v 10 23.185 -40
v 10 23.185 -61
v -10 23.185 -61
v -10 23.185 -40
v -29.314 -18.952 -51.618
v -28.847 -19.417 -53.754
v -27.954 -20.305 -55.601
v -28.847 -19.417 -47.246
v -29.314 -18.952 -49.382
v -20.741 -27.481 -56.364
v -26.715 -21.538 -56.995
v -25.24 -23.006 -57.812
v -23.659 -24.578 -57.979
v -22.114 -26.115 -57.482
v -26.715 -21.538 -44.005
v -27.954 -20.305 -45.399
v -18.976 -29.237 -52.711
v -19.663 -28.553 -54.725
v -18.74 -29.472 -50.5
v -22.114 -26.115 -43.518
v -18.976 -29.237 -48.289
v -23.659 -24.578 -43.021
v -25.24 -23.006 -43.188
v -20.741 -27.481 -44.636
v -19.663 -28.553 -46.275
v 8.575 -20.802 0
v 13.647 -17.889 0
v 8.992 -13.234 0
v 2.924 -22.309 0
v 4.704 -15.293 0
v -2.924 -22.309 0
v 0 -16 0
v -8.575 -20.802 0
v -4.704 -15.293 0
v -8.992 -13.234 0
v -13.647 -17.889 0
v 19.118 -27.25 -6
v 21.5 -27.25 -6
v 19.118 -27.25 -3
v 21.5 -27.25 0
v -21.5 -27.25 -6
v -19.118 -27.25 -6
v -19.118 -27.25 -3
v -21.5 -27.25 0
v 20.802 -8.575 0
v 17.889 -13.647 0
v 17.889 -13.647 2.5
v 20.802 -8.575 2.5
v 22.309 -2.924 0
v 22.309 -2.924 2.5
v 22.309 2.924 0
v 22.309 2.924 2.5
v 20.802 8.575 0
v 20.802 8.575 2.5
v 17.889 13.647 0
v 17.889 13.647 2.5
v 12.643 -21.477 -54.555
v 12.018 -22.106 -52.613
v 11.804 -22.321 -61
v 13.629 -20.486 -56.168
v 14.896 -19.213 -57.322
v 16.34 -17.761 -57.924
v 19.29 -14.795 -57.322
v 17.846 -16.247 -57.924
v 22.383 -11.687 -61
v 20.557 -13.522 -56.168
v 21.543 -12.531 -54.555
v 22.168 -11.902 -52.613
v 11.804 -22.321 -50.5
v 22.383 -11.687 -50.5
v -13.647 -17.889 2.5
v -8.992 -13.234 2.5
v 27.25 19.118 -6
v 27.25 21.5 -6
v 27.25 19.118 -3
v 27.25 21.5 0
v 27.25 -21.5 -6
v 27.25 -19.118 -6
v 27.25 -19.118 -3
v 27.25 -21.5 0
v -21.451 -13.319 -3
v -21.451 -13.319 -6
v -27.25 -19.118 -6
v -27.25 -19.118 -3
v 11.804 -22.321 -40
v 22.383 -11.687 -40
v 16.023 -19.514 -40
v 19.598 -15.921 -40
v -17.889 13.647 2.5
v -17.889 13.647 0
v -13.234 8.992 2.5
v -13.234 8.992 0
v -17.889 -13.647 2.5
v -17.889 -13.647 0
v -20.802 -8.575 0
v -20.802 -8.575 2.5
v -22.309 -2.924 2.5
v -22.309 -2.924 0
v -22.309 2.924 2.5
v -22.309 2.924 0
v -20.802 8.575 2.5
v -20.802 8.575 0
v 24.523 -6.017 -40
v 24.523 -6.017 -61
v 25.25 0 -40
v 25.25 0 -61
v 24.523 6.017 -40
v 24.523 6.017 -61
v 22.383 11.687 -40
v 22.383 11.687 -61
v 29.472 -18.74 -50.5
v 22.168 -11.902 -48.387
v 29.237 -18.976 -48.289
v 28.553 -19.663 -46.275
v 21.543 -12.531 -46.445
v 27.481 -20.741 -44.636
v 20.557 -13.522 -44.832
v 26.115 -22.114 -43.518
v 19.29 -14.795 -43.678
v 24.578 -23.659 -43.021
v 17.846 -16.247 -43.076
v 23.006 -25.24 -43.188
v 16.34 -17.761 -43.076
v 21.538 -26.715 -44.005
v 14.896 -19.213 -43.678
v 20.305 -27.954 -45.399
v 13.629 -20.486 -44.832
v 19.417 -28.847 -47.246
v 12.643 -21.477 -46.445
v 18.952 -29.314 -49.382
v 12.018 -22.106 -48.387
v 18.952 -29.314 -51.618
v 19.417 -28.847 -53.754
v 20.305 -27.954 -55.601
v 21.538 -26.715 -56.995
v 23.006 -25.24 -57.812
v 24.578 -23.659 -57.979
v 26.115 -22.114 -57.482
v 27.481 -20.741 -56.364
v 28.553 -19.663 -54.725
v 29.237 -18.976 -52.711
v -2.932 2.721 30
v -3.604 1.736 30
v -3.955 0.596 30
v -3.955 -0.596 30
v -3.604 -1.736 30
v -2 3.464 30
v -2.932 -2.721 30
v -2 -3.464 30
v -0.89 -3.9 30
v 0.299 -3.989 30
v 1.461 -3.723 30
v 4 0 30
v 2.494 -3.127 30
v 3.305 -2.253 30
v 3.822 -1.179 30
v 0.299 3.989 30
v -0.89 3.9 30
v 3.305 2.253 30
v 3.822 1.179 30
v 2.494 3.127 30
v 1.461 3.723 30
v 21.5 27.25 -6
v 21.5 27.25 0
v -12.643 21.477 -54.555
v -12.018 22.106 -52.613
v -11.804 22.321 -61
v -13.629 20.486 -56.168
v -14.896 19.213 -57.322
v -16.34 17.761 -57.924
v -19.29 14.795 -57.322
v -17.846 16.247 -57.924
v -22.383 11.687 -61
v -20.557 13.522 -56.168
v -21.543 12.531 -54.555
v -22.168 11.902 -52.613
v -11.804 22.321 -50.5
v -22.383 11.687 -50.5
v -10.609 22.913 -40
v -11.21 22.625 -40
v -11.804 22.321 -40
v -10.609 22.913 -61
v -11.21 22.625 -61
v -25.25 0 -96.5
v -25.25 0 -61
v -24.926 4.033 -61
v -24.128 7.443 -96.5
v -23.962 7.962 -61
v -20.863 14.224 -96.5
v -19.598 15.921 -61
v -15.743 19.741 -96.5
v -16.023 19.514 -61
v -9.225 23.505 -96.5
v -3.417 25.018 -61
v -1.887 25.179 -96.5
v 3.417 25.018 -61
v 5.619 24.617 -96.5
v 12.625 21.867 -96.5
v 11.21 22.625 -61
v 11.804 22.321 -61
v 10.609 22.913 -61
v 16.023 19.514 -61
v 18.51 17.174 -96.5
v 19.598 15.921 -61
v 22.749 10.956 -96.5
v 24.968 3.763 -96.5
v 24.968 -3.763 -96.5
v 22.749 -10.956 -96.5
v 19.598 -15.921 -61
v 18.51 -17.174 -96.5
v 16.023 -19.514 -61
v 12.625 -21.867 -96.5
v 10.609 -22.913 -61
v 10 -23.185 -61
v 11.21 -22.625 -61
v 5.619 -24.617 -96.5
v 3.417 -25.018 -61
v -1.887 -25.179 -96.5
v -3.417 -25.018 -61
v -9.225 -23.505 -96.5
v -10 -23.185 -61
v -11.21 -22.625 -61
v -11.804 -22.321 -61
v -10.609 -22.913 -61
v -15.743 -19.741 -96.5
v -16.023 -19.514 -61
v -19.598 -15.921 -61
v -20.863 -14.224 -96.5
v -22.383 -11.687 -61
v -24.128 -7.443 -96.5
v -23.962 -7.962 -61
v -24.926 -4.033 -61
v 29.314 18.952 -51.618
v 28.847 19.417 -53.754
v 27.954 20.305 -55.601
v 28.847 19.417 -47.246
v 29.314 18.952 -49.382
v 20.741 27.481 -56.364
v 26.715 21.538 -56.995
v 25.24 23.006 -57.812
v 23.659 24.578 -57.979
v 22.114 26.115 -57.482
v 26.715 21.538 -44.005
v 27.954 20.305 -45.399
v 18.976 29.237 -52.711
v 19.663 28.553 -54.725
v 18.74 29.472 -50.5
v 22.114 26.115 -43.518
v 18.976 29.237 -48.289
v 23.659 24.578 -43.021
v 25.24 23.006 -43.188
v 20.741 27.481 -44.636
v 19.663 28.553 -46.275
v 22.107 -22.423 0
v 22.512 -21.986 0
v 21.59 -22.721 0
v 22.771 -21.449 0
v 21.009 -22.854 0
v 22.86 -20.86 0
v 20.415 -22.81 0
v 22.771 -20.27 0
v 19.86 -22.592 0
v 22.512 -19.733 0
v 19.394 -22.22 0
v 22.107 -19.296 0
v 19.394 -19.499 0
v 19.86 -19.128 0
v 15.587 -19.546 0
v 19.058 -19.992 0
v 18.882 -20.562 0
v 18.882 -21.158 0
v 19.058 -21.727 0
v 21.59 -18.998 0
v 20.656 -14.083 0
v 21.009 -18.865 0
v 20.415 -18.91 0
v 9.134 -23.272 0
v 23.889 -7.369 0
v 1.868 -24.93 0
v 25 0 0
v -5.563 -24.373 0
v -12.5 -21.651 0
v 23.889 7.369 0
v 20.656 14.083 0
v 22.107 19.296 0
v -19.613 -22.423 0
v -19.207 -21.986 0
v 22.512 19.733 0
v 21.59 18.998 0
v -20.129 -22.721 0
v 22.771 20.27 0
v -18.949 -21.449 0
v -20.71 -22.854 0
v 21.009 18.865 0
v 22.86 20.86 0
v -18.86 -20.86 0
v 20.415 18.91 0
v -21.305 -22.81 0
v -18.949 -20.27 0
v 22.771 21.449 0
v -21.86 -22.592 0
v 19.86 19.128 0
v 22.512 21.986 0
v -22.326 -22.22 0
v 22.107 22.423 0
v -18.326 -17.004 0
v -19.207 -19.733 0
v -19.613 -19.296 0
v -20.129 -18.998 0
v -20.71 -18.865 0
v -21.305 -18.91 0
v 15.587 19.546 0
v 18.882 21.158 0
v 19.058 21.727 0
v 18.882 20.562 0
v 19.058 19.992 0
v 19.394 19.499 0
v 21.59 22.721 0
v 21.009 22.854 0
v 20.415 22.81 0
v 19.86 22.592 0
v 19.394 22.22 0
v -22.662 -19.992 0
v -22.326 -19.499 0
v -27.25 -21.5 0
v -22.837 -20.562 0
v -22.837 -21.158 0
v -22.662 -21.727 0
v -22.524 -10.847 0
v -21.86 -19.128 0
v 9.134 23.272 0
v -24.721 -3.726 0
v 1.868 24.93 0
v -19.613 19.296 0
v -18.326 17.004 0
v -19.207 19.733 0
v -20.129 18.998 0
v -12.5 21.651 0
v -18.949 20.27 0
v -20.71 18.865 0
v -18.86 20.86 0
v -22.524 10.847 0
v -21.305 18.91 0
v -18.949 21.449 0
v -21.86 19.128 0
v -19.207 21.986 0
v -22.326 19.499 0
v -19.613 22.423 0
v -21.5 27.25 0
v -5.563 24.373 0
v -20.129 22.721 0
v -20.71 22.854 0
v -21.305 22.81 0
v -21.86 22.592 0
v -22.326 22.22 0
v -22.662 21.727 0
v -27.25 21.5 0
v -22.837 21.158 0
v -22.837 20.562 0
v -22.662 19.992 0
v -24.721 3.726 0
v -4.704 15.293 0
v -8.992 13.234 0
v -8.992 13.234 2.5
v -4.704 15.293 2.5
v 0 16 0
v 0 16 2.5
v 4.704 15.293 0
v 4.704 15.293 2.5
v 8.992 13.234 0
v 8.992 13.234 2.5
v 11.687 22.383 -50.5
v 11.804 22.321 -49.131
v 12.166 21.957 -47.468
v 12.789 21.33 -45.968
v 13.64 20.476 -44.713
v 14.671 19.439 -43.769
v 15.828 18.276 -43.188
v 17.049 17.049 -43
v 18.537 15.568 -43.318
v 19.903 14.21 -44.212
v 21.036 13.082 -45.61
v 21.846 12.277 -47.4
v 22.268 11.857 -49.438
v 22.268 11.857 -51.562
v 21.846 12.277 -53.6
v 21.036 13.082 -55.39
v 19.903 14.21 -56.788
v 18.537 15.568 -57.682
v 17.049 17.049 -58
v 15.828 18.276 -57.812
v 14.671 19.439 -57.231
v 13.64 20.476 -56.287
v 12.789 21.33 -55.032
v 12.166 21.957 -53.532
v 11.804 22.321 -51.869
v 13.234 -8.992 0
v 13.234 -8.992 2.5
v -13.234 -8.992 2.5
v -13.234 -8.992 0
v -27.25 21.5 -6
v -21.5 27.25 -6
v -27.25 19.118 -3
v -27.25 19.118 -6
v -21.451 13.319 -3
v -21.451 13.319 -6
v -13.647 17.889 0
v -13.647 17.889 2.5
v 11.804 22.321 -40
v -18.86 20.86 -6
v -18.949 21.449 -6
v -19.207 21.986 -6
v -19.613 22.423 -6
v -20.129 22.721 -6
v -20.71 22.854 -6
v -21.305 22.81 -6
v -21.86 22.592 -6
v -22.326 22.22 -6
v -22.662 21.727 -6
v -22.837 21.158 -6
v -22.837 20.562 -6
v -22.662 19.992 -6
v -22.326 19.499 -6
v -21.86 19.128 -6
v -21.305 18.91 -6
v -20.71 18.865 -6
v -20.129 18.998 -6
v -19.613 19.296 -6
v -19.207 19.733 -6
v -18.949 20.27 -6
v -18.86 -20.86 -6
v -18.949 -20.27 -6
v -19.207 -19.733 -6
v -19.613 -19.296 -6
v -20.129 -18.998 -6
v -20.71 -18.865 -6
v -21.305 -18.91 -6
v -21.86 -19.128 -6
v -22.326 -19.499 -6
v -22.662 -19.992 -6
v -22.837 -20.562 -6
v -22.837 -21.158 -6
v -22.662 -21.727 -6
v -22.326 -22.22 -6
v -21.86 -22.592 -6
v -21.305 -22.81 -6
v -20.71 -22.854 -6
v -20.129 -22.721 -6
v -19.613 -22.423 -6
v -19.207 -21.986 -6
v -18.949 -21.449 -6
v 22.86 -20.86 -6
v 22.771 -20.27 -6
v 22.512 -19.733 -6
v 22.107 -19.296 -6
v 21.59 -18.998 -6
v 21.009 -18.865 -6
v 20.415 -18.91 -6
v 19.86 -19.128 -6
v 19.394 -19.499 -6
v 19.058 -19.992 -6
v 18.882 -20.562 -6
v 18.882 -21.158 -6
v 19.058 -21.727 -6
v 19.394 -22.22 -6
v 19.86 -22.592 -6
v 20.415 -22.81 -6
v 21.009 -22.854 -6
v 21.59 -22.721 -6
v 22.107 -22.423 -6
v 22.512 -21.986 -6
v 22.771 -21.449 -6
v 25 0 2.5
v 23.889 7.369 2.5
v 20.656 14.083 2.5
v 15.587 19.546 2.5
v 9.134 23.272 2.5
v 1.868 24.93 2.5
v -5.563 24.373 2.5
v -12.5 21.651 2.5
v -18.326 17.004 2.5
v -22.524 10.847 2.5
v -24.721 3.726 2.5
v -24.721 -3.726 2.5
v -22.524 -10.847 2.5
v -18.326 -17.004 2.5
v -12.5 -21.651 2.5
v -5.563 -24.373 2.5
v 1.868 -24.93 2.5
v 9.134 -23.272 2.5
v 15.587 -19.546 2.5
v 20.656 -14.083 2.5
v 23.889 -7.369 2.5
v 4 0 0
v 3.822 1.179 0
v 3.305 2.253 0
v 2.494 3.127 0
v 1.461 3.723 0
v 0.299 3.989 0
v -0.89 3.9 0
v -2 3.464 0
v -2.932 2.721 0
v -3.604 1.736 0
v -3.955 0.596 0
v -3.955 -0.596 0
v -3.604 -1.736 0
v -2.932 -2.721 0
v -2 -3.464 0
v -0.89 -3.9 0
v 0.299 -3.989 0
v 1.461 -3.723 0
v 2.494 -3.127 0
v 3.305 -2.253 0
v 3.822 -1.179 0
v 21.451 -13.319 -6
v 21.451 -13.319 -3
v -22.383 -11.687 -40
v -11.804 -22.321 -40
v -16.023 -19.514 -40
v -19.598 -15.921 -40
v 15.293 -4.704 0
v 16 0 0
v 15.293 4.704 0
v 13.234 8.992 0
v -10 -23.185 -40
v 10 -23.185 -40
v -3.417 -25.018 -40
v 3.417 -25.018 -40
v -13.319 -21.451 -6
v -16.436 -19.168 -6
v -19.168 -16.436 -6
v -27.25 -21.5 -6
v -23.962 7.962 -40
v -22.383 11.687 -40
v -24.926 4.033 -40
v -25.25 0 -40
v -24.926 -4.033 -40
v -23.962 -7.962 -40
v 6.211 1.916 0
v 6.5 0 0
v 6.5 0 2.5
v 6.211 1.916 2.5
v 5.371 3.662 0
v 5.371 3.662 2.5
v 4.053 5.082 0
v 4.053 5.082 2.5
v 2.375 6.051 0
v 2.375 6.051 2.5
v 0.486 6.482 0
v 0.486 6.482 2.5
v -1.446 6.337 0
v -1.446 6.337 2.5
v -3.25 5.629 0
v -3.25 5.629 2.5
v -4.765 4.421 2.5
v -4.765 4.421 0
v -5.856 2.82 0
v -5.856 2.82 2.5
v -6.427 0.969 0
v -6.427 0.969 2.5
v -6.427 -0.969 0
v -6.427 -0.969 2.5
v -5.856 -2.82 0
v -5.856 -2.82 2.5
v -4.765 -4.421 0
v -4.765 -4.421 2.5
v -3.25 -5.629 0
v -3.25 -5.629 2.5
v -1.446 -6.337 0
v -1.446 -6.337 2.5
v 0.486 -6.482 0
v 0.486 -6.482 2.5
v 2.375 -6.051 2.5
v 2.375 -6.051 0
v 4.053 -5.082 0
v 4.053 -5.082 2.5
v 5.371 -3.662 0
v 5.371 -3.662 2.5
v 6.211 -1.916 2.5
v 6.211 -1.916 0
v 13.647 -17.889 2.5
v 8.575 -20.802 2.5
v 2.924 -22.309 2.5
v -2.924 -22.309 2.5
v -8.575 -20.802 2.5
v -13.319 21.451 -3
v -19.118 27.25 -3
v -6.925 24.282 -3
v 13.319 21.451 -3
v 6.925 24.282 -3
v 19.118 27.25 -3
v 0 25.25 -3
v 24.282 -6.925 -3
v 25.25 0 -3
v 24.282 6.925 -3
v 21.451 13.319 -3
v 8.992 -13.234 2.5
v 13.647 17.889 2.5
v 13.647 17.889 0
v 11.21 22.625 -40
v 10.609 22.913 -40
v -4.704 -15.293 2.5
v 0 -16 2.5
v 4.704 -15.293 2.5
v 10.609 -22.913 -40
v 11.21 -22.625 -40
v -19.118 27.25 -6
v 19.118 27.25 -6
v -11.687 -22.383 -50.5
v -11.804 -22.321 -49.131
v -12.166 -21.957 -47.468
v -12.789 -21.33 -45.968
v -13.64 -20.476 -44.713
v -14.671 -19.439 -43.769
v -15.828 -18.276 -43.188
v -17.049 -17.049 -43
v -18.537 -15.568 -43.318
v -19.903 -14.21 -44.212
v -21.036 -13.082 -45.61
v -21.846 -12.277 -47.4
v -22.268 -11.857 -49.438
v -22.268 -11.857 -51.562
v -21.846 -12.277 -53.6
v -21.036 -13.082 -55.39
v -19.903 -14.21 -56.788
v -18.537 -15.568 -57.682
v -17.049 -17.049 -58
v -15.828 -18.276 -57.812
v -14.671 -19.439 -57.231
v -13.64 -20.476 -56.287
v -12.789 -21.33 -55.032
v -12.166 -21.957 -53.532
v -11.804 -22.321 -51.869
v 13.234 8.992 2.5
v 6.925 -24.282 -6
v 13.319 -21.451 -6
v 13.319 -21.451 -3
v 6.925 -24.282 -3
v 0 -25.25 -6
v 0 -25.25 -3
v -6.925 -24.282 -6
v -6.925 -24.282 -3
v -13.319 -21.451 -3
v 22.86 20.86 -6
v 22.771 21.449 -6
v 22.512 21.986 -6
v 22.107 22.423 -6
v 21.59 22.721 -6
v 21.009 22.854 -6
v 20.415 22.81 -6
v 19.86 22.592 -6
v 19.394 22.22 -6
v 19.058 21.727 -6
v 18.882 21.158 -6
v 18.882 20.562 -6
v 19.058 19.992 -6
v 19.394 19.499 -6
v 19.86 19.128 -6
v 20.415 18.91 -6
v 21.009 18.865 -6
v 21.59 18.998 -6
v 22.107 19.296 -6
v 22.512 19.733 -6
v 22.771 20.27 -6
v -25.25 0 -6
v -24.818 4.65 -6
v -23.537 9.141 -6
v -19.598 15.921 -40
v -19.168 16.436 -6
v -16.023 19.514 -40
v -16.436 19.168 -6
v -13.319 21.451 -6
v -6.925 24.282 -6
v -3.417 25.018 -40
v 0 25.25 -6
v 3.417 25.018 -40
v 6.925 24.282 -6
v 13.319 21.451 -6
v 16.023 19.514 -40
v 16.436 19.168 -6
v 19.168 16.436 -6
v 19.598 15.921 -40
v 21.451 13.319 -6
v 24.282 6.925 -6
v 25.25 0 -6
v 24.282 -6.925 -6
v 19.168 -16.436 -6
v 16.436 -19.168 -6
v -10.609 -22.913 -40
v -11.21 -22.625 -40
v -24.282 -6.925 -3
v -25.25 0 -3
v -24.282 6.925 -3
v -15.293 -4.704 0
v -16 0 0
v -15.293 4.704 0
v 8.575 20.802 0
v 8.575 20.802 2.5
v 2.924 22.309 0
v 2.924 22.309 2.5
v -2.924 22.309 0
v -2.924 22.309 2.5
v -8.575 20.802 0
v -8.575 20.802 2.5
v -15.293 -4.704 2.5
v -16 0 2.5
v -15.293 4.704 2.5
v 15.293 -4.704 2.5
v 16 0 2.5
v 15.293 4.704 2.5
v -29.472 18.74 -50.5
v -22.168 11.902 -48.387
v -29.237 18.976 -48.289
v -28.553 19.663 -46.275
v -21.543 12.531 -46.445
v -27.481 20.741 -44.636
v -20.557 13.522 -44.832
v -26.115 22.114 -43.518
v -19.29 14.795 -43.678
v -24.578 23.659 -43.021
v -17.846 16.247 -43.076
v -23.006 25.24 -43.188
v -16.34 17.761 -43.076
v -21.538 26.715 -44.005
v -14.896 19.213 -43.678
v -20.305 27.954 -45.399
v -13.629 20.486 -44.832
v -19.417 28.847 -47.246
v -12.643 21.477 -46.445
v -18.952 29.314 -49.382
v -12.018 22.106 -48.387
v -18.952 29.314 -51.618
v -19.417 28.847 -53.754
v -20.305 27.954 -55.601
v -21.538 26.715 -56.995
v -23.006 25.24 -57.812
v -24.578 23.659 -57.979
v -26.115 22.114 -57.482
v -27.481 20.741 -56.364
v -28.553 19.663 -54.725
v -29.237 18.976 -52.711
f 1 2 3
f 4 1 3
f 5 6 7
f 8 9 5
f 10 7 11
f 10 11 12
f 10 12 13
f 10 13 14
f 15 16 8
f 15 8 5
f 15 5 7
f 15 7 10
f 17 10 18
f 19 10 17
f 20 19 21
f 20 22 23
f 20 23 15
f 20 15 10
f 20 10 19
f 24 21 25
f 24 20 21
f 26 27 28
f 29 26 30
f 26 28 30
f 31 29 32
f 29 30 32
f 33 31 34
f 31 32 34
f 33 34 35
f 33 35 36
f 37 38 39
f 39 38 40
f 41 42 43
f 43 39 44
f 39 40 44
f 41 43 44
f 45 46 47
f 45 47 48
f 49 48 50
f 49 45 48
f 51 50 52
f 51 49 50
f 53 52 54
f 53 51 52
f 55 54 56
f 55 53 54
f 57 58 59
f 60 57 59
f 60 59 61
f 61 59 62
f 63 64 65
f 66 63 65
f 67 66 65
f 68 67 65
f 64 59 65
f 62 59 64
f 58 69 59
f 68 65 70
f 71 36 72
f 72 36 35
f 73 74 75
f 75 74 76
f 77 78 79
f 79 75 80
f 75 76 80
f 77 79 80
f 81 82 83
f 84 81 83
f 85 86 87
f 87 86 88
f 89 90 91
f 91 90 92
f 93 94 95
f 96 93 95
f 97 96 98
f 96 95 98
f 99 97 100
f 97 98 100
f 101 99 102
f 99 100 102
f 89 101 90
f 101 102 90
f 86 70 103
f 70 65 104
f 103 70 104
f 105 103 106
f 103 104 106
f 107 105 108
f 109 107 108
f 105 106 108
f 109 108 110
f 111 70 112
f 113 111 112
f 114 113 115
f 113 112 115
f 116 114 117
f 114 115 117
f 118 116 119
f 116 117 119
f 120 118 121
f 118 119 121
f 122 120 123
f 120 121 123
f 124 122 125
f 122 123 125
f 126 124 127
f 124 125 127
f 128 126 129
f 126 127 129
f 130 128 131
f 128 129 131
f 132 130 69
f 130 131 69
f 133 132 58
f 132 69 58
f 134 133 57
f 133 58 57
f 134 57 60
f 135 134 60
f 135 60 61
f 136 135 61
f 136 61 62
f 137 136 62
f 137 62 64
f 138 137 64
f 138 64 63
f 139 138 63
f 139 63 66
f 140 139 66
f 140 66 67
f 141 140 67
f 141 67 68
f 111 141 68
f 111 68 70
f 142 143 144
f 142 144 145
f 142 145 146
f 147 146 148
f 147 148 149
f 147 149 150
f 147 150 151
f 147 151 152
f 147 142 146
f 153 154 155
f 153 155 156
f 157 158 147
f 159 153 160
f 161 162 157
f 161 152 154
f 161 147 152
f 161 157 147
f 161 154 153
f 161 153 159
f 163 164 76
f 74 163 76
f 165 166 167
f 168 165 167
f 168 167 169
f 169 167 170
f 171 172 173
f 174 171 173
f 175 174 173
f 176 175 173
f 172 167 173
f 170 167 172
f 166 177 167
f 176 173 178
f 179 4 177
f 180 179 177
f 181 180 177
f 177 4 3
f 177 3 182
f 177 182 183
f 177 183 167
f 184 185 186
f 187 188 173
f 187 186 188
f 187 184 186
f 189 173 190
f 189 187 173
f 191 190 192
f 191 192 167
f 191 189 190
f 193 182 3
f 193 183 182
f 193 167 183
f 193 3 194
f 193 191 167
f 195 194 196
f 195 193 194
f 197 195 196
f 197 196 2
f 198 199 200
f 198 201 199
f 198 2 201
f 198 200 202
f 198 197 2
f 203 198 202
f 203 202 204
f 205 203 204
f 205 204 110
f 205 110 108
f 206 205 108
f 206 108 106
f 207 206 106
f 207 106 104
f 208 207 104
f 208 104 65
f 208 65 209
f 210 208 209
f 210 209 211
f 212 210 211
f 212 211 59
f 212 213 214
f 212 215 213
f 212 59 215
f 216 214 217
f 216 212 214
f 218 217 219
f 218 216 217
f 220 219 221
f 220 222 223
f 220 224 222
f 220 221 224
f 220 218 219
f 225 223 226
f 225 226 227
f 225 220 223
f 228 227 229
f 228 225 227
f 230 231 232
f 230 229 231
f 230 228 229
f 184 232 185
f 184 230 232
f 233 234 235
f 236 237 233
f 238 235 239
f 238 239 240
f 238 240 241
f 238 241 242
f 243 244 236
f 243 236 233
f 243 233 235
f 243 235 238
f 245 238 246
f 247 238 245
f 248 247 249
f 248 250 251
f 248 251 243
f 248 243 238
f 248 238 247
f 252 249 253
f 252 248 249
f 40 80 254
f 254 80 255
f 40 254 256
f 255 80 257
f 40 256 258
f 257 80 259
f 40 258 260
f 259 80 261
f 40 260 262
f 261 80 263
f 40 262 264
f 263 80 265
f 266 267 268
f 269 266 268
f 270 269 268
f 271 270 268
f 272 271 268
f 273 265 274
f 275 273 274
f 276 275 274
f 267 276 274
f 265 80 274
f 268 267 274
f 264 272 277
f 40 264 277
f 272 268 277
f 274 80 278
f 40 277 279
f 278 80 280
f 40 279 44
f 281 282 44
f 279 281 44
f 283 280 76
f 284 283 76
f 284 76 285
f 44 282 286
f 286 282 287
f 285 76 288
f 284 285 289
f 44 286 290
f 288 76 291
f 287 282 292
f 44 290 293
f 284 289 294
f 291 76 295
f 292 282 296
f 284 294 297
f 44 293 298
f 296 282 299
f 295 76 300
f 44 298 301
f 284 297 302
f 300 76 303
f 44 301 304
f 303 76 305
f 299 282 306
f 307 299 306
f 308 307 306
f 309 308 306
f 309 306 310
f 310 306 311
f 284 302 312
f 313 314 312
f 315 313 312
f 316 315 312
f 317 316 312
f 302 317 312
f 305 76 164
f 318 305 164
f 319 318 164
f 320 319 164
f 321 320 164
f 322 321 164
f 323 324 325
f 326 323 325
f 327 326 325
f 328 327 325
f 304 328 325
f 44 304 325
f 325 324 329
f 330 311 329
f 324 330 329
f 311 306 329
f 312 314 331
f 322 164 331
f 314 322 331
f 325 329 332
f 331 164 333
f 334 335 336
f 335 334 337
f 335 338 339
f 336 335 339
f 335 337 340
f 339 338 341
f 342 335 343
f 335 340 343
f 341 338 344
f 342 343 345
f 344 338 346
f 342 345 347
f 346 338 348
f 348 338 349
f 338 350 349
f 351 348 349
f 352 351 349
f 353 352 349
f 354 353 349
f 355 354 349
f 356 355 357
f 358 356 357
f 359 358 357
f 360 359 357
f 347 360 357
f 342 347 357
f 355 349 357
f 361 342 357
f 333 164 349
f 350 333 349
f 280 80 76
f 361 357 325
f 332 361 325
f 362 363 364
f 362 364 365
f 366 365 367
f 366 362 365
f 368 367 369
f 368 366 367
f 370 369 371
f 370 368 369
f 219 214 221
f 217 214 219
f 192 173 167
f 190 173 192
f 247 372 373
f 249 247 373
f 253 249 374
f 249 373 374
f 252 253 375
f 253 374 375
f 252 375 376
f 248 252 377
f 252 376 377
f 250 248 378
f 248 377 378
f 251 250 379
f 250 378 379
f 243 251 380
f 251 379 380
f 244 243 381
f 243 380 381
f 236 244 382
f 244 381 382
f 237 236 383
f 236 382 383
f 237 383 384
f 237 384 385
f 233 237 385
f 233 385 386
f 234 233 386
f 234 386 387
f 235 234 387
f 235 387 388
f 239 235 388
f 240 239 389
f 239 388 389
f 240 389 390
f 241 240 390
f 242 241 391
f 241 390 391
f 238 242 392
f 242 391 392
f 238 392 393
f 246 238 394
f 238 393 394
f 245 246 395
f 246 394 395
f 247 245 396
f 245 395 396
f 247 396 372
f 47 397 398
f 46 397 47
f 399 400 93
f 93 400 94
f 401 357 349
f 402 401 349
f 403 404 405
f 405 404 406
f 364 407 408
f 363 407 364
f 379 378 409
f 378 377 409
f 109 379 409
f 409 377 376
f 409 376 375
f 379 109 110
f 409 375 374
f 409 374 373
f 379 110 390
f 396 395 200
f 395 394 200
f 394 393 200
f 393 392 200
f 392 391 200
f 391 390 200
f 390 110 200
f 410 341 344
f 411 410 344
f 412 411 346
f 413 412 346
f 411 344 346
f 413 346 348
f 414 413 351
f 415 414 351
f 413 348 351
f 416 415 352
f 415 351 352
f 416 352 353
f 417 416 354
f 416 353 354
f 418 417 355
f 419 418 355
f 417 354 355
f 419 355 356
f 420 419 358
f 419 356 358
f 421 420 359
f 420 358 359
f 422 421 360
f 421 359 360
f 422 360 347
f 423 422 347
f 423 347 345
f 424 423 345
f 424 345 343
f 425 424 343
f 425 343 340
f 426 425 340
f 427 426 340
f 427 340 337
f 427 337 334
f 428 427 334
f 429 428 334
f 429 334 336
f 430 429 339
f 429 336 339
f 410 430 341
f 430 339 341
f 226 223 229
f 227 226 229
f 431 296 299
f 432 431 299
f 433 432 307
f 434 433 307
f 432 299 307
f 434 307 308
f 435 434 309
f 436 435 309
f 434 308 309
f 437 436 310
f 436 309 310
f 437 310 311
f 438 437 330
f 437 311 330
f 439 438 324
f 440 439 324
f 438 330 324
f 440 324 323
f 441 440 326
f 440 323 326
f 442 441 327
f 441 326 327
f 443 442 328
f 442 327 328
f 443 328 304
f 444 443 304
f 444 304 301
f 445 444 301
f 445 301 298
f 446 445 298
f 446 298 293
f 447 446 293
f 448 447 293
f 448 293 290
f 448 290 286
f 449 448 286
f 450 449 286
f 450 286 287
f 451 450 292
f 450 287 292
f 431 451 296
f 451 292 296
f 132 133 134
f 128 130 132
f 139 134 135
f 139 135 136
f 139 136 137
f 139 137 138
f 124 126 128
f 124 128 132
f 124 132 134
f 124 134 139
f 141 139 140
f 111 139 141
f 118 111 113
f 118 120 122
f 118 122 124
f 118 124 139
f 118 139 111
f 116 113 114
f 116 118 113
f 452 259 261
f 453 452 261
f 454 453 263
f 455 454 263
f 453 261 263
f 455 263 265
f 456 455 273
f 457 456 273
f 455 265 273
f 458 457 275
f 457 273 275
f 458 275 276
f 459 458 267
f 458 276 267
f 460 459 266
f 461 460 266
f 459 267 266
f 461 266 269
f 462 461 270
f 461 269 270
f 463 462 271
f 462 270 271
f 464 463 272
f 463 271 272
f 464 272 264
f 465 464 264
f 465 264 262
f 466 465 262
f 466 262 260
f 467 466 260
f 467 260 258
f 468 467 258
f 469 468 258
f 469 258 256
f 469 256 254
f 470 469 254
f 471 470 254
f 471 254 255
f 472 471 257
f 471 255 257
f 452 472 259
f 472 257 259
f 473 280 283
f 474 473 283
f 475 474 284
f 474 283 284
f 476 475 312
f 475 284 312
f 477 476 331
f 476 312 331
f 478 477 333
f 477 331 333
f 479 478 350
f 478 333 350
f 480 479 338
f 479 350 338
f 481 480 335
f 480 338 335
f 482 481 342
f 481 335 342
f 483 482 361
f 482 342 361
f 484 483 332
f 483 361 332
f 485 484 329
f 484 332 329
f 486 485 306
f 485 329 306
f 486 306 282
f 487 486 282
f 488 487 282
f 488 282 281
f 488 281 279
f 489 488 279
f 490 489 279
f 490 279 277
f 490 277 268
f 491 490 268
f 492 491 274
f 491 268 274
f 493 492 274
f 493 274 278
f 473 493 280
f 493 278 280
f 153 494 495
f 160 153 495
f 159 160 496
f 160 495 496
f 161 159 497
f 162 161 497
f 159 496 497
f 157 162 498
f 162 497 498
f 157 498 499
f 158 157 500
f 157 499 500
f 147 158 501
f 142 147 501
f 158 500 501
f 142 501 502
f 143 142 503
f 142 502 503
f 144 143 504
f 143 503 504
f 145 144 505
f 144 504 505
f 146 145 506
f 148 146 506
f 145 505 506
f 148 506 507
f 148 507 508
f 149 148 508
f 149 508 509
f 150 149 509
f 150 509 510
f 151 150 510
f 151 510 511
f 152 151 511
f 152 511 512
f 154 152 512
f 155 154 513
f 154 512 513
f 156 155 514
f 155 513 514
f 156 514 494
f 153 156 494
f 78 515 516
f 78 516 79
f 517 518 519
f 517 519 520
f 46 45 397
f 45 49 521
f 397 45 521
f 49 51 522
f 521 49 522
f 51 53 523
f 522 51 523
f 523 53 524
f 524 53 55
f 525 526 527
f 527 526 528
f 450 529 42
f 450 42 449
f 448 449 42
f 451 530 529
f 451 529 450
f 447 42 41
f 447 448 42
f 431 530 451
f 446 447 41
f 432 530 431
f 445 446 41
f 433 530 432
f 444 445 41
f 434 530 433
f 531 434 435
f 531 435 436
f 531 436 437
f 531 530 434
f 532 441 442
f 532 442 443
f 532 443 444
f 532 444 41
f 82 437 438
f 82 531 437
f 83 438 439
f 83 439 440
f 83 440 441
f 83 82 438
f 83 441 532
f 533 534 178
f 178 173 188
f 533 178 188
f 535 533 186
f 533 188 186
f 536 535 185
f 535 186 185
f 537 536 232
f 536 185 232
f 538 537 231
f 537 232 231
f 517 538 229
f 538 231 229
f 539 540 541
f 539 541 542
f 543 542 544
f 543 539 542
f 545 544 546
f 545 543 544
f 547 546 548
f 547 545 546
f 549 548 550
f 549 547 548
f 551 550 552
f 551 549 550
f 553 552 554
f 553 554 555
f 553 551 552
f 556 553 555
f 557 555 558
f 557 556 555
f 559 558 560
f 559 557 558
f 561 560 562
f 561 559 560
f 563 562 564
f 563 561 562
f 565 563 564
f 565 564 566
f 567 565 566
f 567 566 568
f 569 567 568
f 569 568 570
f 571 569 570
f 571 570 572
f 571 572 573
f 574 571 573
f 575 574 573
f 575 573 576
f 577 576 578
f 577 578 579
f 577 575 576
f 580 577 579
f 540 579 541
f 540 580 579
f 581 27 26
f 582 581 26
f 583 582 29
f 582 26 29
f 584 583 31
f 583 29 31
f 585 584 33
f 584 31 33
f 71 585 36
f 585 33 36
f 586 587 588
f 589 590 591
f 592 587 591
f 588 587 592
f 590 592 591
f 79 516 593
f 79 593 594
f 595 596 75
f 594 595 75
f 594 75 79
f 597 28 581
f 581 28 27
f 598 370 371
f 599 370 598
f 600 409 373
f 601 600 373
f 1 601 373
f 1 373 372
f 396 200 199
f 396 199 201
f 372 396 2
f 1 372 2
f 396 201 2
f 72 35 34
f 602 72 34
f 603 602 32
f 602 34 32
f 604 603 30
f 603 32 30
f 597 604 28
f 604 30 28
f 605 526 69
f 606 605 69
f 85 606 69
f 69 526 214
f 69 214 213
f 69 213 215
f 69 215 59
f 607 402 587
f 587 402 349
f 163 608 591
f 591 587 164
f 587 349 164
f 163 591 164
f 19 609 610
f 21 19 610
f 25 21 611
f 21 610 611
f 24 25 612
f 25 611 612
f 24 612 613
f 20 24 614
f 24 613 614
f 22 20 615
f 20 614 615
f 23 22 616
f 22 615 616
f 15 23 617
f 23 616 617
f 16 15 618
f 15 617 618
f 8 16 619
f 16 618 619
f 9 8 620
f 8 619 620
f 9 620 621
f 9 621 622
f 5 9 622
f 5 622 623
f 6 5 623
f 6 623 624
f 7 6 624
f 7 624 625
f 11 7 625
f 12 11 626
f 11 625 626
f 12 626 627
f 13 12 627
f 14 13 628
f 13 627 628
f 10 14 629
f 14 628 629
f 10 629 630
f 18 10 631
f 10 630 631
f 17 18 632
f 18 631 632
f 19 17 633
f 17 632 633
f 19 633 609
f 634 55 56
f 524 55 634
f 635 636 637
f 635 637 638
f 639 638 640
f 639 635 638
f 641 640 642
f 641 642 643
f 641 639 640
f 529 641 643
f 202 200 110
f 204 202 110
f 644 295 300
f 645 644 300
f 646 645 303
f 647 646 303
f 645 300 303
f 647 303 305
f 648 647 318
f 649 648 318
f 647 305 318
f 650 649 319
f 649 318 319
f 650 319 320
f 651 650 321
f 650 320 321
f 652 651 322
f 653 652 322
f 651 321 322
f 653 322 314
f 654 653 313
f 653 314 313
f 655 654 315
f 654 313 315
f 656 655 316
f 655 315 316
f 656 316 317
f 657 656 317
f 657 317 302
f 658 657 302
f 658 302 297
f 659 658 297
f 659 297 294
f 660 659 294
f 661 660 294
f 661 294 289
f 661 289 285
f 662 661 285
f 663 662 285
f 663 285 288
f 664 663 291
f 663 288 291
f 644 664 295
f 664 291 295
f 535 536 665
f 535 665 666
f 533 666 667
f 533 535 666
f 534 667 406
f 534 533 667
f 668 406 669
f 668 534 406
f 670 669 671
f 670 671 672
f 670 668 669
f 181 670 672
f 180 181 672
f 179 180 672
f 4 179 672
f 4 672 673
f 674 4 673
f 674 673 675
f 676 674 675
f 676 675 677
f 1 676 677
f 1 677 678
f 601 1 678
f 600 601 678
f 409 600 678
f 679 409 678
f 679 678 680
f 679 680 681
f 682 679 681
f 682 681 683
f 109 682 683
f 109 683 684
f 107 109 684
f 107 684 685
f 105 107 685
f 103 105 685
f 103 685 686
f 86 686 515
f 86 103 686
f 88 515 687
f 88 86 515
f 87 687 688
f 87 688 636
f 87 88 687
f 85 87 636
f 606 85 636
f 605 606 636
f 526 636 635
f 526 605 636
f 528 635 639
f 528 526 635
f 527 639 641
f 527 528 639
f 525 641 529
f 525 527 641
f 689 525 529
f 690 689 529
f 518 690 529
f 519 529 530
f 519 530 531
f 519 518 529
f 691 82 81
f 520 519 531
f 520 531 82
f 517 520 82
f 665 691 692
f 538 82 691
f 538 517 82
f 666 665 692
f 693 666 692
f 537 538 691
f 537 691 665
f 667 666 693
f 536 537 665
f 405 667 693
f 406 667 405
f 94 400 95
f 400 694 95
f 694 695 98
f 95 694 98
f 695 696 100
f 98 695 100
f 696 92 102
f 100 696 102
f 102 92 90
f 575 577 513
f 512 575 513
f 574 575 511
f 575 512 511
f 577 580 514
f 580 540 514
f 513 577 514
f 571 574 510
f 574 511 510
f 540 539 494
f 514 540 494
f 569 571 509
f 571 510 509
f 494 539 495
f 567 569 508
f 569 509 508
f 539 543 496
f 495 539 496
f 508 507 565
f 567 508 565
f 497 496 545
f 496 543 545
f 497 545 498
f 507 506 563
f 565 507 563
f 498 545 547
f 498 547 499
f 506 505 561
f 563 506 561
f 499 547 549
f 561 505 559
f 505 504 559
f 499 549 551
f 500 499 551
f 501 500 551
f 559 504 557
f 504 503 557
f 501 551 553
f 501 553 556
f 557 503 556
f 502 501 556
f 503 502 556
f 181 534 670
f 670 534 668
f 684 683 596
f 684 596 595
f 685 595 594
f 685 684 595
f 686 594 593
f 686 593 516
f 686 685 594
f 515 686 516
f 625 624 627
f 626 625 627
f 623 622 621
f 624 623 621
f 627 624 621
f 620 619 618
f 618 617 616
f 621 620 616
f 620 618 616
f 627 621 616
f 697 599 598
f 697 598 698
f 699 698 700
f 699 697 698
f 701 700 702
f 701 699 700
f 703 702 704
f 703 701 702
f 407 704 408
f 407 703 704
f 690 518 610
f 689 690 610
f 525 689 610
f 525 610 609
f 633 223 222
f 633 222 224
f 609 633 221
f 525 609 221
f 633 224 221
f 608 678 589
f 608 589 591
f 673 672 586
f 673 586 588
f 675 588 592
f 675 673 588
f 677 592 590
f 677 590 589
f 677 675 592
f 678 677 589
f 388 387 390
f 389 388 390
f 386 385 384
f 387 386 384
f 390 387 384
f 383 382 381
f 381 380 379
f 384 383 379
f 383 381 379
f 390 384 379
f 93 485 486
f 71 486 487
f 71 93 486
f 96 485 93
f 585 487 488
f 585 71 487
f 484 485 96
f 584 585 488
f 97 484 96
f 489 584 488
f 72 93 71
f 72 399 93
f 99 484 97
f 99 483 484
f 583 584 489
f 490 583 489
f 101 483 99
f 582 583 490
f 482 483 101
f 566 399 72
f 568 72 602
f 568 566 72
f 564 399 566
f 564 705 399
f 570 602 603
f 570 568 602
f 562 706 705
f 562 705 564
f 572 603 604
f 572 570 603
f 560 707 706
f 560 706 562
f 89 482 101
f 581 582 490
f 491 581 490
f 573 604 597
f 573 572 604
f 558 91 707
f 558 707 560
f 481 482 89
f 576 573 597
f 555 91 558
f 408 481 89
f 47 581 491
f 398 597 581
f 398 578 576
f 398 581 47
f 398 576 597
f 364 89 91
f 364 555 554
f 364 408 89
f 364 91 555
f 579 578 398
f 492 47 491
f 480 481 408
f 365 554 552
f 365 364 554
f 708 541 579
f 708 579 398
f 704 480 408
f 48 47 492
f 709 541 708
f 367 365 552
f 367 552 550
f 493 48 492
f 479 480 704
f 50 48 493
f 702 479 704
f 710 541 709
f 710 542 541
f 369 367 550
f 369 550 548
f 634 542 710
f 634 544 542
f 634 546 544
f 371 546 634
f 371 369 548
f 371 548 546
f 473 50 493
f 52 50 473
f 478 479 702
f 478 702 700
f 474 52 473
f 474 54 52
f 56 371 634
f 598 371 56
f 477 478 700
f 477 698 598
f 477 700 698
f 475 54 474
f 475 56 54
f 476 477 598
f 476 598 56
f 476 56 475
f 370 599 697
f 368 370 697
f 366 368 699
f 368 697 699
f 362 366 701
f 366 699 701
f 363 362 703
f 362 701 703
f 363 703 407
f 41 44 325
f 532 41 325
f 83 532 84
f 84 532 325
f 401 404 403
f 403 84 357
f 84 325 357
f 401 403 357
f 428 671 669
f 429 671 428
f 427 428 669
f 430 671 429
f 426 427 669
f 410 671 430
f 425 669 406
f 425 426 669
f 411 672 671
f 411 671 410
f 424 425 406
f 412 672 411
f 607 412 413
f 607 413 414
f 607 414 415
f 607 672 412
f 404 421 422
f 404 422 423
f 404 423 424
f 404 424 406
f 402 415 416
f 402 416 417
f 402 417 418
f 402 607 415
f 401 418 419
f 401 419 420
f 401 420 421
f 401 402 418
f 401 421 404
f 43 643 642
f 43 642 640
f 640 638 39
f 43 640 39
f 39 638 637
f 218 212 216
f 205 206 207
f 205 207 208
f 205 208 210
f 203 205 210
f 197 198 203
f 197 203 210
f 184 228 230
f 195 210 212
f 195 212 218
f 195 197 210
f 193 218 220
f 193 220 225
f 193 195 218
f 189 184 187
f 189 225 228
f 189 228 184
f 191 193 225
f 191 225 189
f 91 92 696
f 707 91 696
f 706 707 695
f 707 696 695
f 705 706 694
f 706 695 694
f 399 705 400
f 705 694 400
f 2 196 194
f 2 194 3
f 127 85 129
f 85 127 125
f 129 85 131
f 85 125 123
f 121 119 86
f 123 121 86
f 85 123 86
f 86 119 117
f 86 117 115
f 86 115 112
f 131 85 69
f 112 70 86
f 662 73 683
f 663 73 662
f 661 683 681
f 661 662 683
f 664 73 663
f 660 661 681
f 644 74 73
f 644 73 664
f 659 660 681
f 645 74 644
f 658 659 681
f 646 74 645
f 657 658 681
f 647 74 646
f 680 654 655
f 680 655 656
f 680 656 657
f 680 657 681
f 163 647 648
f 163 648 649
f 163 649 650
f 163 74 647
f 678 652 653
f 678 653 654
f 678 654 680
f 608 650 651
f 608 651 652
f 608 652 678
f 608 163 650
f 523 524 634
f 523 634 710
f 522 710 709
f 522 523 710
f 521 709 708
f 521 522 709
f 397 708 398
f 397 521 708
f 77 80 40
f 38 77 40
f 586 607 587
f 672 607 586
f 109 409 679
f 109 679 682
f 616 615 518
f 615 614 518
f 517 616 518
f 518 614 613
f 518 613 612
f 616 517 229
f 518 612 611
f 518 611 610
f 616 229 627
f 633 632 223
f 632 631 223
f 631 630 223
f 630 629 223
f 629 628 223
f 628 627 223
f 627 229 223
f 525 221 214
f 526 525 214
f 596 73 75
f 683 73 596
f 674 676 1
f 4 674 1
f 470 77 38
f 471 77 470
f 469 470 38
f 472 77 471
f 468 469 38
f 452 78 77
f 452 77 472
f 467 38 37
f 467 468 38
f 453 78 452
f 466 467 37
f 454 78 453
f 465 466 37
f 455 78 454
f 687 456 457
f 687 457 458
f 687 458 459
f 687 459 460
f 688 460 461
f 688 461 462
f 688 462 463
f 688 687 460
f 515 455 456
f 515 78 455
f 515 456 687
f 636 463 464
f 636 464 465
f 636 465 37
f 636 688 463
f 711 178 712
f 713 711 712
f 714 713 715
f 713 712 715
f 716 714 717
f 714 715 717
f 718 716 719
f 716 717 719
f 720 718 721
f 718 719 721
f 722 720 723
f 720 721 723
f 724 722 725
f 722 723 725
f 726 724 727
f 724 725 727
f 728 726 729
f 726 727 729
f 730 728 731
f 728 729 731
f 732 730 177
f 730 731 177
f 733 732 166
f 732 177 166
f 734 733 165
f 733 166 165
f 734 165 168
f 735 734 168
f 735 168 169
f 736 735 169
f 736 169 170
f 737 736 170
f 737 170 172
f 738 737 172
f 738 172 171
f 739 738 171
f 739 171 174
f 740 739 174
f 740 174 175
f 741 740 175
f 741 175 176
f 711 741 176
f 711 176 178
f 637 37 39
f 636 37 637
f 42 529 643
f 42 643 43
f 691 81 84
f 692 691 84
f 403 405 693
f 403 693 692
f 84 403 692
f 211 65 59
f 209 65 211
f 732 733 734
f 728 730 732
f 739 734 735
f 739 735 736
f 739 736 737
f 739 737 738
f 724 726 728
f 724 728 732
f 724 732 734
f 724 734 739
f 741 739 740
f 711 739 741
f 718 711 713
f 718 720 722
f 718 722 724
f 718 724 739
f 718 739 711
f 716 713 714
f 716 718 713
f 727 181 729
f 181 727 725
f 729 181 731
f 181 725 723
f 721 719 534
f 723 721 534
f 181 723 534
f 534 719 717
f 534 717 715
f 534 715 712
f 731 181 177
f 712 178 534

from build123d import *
from build123d.topology import SkipClean

# Parameters (mm, degrees)
SKETCH1_R           = 2
BOSS_EXTRUDE1_DEPTH = 6
SKETCH2_R           = 25
SKETCH2_R_2         = 6.5
BOSS_EXTRUDE2_DEPTH = 2.5
SKETCH1_3_R         = 4
BOSS_EXTRUDE3_DEPTH = 30
CUT_EXTRUDE1_DEPTH  = 3
BOSS_EXTRUDE4_START = 34
SKETCH5_R           = 25.25
BOSS_EXTRUDE4_DEPTH = 34
BOSS_EXTRUDE5_START = 21
BOSS_EXTRUDE5_DEPTH = 21
BOSS_EXTRUDE6_START = 35.5
SKETCH7_R           = 25.25
BOSS_EXTRUDE6_DEPTH = 35.5
SKETCH8_R           = 7.5
BOSS_EXTRUDE7_DEPTH = 10
CIRPATTERN1_COUNT   = 4


with BuildPart() as part:
    # Sketch1 → Boss-Extrude1 (new body)
    with BuildSketch(Plane.XY):
        Polygon((-21.5, 27.25), (21.5, 27.25), (27.25, 21.5), (27.25, -21.5), (21.5, -27.25), (-21.5, -27.25), (-27.25, -21.5), (-27.25, 21.5), align=None)
        with Locations((20.859650045, 20.859650045)):
            Circle(SKETCH1_R, mode=Mode.SUBTRACT)
        with Locations((-20.859650045, 20.859650045)):
            Circle(SKETCH1_R, mode=Mode.SUBTRACT)
        with Locations((-20.859650045, -20.859650045)):
            Circle(SKETCH1_R, mode=Mode.SUBTRACT)
        with Locations((20.859650045, -20.859650045)):
            Circle(SKETCH1_R, mode=Mode.SUBTRACT)
    extrude(amount=-BOSS_EXTRUDE1_DEPTH)

    # Sketch2 → Boss-Extrude2 (add)
    with BuildSketch(Plane.XY):
        Circle(SKETCH2_R)
        Circle(SKETCH2_R_2, mode=Mode.SUBTRACT)
        with BuildLine():
            Line((-17.889167375, 13.646526688), (-13.234375729, 8.991735042))
            ThreePointArc((-13.234375729, 8.991735042), (-16, 0), (-13.234375729, -8.991735042))
            Line((-13.234375729, -8.991735042), (-17.889167375, -13.646526688))
            ThreePointArc((-17.889167375, -13.646526688), (-22.5, 0), (-17.889167375, 13.646526688))
        make_face(mode=Mode.SUBTRACT)
        with BuildLine():
            Line((-13.646526688, 17.889167375), (-8.991735042, 13.234375729))
            ThreePointArc((-8.991735042, 13.234375729), (0, 16), (8.991735042, 13.234375729))
            Line((8.991735042, 13.234375729), (13.646526688, 17.889167375))
            ThreePointArc((13.646526688, 17.889167375), (0, 22.5), (-13.646526688, 17.889167375))
        make_face(mode=Mode.SUBTRACT)
        with BuildLine():
            Line((17.889167375, 13.646526688), (13.234375729, 8.991735042))
            ThreePointArc((13.234375729, 8.991735042), (16, 0), (13.234375729, -8.991735042))
            Line((13.234375729, -8.991735042), (17.889167375, -13.646526688))
            ThreePointArc((17.889167375, -13.646526688), (22.5, 0), (17.889167375, 13.646526688))
        make_face(mode=Mode.SUBTRACT)
        with BuildLine():
            Line((8.991735042, -13.234375729), (13.646526688, -17.889167375))
            ThreePointArc((13.646526688, -17.889167375), (0, -22.5), (-13.646526688, -17.889167375))
            Line((-13.646526688, -17.889167375), (-8.991735042, -13.234375729))
            ThreePointArc((-8.991735042, -13.234375729), (0, -16), (8.991735042, -13.234375729))
        make_face(mode=Mode.SUBTRACT)
    extrude(amount=BOSS_EXTRUDE2_DEPTH)

    # Sketch1<3> → Boss-Extrude3 (add)
    with BuildSketch(Plane.XY):
        Circle(SKETCH1_3_R)
    extrude(amount=BOSS_EXTRUDE3_DEPTH)

    # Sketch3 → Cut-Extrude1 (cut)
    with BuildSketch(Plane(origin=(0, 0, -6), x_dir=(-1, 0, 0), z_dir=(0, 0, -1))):
        with BuildLine():
            Line((19.118272016, 27.25), (13.319474659, 21.451202643))
            ThreePointArc((13.319474659, 21.451202643), (0, 25.25), (-13.319474659, 21.451202643))
            Line((-13.319474659, 21.451202643), (-19.118272016, 27.25))
            Line((-19.118272016, 27.25), (19.118272016, 27.25))
        make_face()
        with BuildLine():
            Line((27.25, 19.118272016), (21.451202643, 13.319474659))
            ThreePointArc((21.451202643, 13.319474659), (25.25, 0), (21.451202643, -13.319474659))
            Line((21.451202643, -13.319474659), (27.25, -19.118272016))
            Line((27.25, -19.118272016), (27.25, 19.118272016))
        make_face()
        with BuildLine():
            Line((-27.25, 19.118272016), (-21.451202643, 13.319474659))
            ThreePointArc((-21.451202643, 13.319474659), (-25.25, 0), (-21.451202643, -13.319474659))
            Line((-21.451202643, -13.319474659), (-27.25, -19.118272016))
            Line((-27.25, -19.118272016), (-27.25, 19.118272016))
        make_face()
        with BuildLine():
            Line((-19.118272016, -27.25), (-13.319474659, -21.451202643))
            ThreePointArc((-13.319474659, -21.451202643), (0, -25.25), (13.319474659, -21.451202643))
            Line((13.319474659, -21.451202643), (19.118272016, -27.25))
            Line((19.118272016, -27.25), (-19.118272016, -27.25))
        make_face()
    extrude(amount=-CUT_EXTRUDE1_DEPTH, mode=Mode.SUBTRACT)

    # Sketch5 → Boss-Extrude4 (add)
    with BuildSketch(Plane(origin=(0, 0, -6), x_dir=(-1, 0, 0), z_dir=(0, 0, -1)).offset(BOSS_EXTRUDE4_START)):
        Circle(SKETCH5_R)
    extrude(amount=-BOSS_EXTRUDE4_DEPTH)

    # Sketch6 → Boss-Extrude5 (add)
    with SkipClean():  # the faces are left unmerged after this step: merging them gives an invalid solid
        with BuildSketch(Plane(origin=(0, 0, -40), x_dir=(-1, 0, 0), z_dir=(0, 0, -1)).offset(BOSS_EXTRUDE5_START)):
            with BuildLine():
                Line((-10, 23.185394109), (10, 23.185394109))
                ThreePointArc((10, 23.185394109), (10.910387984, 22.77116453), (11.803656596, 22.321204962))
                Line((11.803656596, 22.321204962), (22.382531694, 11.686948915))
                ThreePointArc((22.382531694, 11.686948915), (25.25, 0), (22.382531694, -11.686948915))
                Line((22.382531694, -11.686948915), (11.803656596, -22.321204962))
                ThreePointArc((11.803656596, -22.321204962), (10.910387984, -22.77116453), (10, -23.185394109))
                Line((10, -23.185394109), (-10, -23.185394109))
                ThreePointArc((-10, -23.185394109), (-10.910387984, -22.77116453), (-11.803656596, -22.321204962))
                Line((-11.803656596, -22.321204962), (-22.382531694, -11.686948915))
                ThreePointArc((-22.382531694, -11.686948915), (-25.25, 0), (-22.382531694, 11.686948915))
                Line((-22.382531694, 11.686948915), (-11.803656596, 22.321204962))
                ThreePointArc((-11.803656596, 22.321204962), (-10.910387984, 22.77116453), (-10, 23.185394109))
            make_face()
        extrude(amount=-BOSS_EXTRUDE5_DEPTH)

    # Sketch7 → Boss-Extrude6 (add)
    with SkipClean():  # the faces are left unmerged after this step: merging them gives an invalid solid
        with BuildSketch(Plane(origin=(0, 0, -61), x_dir=(-1, 0, 0), z_dir=(0, 0, -1)).offset(BOSS_EXTRUDE6_START)):
            Circle(SKETCH7_R)
        extrude(amount=-BOSS_EXTRUDE6_DEPTH)

    # Sketch8 → Boss-Extrude7 (add)
    with SkipClean():  # the faces are left unmerged after this step: merging them gives an invalid solid
        with BuildSketch(Plane(origin=(-17.093094145, 17.004076939, 0), x_dir=(0.7052583398611622, 0.7089504031004409, 0), z_dir=(-0.7089504031004409, 0.7052583398611622, 0))):
            with Locations((0, 50.5)):
                Circle(SKETCH8_R)
        boss_extrude7 = extrude(amount=BOSS_EXTRUDE7_DEPTH)

    # CirPattern1: Boss-Extrude7 ×4 about axis
    with SkipClean():  # the faces are left unmerged after this step: merging them gives an invalid solid
        cirpattern1_axis = Axis((0, 0, -3), (0, 0, -1))
        for i in range(1, CIRPATTERN1_COUNT):
            add(boss_extrude7.rotate(cirpattern1_axis, i * 360 / CIRPATTERN1_COUNT))


solid = part.part
